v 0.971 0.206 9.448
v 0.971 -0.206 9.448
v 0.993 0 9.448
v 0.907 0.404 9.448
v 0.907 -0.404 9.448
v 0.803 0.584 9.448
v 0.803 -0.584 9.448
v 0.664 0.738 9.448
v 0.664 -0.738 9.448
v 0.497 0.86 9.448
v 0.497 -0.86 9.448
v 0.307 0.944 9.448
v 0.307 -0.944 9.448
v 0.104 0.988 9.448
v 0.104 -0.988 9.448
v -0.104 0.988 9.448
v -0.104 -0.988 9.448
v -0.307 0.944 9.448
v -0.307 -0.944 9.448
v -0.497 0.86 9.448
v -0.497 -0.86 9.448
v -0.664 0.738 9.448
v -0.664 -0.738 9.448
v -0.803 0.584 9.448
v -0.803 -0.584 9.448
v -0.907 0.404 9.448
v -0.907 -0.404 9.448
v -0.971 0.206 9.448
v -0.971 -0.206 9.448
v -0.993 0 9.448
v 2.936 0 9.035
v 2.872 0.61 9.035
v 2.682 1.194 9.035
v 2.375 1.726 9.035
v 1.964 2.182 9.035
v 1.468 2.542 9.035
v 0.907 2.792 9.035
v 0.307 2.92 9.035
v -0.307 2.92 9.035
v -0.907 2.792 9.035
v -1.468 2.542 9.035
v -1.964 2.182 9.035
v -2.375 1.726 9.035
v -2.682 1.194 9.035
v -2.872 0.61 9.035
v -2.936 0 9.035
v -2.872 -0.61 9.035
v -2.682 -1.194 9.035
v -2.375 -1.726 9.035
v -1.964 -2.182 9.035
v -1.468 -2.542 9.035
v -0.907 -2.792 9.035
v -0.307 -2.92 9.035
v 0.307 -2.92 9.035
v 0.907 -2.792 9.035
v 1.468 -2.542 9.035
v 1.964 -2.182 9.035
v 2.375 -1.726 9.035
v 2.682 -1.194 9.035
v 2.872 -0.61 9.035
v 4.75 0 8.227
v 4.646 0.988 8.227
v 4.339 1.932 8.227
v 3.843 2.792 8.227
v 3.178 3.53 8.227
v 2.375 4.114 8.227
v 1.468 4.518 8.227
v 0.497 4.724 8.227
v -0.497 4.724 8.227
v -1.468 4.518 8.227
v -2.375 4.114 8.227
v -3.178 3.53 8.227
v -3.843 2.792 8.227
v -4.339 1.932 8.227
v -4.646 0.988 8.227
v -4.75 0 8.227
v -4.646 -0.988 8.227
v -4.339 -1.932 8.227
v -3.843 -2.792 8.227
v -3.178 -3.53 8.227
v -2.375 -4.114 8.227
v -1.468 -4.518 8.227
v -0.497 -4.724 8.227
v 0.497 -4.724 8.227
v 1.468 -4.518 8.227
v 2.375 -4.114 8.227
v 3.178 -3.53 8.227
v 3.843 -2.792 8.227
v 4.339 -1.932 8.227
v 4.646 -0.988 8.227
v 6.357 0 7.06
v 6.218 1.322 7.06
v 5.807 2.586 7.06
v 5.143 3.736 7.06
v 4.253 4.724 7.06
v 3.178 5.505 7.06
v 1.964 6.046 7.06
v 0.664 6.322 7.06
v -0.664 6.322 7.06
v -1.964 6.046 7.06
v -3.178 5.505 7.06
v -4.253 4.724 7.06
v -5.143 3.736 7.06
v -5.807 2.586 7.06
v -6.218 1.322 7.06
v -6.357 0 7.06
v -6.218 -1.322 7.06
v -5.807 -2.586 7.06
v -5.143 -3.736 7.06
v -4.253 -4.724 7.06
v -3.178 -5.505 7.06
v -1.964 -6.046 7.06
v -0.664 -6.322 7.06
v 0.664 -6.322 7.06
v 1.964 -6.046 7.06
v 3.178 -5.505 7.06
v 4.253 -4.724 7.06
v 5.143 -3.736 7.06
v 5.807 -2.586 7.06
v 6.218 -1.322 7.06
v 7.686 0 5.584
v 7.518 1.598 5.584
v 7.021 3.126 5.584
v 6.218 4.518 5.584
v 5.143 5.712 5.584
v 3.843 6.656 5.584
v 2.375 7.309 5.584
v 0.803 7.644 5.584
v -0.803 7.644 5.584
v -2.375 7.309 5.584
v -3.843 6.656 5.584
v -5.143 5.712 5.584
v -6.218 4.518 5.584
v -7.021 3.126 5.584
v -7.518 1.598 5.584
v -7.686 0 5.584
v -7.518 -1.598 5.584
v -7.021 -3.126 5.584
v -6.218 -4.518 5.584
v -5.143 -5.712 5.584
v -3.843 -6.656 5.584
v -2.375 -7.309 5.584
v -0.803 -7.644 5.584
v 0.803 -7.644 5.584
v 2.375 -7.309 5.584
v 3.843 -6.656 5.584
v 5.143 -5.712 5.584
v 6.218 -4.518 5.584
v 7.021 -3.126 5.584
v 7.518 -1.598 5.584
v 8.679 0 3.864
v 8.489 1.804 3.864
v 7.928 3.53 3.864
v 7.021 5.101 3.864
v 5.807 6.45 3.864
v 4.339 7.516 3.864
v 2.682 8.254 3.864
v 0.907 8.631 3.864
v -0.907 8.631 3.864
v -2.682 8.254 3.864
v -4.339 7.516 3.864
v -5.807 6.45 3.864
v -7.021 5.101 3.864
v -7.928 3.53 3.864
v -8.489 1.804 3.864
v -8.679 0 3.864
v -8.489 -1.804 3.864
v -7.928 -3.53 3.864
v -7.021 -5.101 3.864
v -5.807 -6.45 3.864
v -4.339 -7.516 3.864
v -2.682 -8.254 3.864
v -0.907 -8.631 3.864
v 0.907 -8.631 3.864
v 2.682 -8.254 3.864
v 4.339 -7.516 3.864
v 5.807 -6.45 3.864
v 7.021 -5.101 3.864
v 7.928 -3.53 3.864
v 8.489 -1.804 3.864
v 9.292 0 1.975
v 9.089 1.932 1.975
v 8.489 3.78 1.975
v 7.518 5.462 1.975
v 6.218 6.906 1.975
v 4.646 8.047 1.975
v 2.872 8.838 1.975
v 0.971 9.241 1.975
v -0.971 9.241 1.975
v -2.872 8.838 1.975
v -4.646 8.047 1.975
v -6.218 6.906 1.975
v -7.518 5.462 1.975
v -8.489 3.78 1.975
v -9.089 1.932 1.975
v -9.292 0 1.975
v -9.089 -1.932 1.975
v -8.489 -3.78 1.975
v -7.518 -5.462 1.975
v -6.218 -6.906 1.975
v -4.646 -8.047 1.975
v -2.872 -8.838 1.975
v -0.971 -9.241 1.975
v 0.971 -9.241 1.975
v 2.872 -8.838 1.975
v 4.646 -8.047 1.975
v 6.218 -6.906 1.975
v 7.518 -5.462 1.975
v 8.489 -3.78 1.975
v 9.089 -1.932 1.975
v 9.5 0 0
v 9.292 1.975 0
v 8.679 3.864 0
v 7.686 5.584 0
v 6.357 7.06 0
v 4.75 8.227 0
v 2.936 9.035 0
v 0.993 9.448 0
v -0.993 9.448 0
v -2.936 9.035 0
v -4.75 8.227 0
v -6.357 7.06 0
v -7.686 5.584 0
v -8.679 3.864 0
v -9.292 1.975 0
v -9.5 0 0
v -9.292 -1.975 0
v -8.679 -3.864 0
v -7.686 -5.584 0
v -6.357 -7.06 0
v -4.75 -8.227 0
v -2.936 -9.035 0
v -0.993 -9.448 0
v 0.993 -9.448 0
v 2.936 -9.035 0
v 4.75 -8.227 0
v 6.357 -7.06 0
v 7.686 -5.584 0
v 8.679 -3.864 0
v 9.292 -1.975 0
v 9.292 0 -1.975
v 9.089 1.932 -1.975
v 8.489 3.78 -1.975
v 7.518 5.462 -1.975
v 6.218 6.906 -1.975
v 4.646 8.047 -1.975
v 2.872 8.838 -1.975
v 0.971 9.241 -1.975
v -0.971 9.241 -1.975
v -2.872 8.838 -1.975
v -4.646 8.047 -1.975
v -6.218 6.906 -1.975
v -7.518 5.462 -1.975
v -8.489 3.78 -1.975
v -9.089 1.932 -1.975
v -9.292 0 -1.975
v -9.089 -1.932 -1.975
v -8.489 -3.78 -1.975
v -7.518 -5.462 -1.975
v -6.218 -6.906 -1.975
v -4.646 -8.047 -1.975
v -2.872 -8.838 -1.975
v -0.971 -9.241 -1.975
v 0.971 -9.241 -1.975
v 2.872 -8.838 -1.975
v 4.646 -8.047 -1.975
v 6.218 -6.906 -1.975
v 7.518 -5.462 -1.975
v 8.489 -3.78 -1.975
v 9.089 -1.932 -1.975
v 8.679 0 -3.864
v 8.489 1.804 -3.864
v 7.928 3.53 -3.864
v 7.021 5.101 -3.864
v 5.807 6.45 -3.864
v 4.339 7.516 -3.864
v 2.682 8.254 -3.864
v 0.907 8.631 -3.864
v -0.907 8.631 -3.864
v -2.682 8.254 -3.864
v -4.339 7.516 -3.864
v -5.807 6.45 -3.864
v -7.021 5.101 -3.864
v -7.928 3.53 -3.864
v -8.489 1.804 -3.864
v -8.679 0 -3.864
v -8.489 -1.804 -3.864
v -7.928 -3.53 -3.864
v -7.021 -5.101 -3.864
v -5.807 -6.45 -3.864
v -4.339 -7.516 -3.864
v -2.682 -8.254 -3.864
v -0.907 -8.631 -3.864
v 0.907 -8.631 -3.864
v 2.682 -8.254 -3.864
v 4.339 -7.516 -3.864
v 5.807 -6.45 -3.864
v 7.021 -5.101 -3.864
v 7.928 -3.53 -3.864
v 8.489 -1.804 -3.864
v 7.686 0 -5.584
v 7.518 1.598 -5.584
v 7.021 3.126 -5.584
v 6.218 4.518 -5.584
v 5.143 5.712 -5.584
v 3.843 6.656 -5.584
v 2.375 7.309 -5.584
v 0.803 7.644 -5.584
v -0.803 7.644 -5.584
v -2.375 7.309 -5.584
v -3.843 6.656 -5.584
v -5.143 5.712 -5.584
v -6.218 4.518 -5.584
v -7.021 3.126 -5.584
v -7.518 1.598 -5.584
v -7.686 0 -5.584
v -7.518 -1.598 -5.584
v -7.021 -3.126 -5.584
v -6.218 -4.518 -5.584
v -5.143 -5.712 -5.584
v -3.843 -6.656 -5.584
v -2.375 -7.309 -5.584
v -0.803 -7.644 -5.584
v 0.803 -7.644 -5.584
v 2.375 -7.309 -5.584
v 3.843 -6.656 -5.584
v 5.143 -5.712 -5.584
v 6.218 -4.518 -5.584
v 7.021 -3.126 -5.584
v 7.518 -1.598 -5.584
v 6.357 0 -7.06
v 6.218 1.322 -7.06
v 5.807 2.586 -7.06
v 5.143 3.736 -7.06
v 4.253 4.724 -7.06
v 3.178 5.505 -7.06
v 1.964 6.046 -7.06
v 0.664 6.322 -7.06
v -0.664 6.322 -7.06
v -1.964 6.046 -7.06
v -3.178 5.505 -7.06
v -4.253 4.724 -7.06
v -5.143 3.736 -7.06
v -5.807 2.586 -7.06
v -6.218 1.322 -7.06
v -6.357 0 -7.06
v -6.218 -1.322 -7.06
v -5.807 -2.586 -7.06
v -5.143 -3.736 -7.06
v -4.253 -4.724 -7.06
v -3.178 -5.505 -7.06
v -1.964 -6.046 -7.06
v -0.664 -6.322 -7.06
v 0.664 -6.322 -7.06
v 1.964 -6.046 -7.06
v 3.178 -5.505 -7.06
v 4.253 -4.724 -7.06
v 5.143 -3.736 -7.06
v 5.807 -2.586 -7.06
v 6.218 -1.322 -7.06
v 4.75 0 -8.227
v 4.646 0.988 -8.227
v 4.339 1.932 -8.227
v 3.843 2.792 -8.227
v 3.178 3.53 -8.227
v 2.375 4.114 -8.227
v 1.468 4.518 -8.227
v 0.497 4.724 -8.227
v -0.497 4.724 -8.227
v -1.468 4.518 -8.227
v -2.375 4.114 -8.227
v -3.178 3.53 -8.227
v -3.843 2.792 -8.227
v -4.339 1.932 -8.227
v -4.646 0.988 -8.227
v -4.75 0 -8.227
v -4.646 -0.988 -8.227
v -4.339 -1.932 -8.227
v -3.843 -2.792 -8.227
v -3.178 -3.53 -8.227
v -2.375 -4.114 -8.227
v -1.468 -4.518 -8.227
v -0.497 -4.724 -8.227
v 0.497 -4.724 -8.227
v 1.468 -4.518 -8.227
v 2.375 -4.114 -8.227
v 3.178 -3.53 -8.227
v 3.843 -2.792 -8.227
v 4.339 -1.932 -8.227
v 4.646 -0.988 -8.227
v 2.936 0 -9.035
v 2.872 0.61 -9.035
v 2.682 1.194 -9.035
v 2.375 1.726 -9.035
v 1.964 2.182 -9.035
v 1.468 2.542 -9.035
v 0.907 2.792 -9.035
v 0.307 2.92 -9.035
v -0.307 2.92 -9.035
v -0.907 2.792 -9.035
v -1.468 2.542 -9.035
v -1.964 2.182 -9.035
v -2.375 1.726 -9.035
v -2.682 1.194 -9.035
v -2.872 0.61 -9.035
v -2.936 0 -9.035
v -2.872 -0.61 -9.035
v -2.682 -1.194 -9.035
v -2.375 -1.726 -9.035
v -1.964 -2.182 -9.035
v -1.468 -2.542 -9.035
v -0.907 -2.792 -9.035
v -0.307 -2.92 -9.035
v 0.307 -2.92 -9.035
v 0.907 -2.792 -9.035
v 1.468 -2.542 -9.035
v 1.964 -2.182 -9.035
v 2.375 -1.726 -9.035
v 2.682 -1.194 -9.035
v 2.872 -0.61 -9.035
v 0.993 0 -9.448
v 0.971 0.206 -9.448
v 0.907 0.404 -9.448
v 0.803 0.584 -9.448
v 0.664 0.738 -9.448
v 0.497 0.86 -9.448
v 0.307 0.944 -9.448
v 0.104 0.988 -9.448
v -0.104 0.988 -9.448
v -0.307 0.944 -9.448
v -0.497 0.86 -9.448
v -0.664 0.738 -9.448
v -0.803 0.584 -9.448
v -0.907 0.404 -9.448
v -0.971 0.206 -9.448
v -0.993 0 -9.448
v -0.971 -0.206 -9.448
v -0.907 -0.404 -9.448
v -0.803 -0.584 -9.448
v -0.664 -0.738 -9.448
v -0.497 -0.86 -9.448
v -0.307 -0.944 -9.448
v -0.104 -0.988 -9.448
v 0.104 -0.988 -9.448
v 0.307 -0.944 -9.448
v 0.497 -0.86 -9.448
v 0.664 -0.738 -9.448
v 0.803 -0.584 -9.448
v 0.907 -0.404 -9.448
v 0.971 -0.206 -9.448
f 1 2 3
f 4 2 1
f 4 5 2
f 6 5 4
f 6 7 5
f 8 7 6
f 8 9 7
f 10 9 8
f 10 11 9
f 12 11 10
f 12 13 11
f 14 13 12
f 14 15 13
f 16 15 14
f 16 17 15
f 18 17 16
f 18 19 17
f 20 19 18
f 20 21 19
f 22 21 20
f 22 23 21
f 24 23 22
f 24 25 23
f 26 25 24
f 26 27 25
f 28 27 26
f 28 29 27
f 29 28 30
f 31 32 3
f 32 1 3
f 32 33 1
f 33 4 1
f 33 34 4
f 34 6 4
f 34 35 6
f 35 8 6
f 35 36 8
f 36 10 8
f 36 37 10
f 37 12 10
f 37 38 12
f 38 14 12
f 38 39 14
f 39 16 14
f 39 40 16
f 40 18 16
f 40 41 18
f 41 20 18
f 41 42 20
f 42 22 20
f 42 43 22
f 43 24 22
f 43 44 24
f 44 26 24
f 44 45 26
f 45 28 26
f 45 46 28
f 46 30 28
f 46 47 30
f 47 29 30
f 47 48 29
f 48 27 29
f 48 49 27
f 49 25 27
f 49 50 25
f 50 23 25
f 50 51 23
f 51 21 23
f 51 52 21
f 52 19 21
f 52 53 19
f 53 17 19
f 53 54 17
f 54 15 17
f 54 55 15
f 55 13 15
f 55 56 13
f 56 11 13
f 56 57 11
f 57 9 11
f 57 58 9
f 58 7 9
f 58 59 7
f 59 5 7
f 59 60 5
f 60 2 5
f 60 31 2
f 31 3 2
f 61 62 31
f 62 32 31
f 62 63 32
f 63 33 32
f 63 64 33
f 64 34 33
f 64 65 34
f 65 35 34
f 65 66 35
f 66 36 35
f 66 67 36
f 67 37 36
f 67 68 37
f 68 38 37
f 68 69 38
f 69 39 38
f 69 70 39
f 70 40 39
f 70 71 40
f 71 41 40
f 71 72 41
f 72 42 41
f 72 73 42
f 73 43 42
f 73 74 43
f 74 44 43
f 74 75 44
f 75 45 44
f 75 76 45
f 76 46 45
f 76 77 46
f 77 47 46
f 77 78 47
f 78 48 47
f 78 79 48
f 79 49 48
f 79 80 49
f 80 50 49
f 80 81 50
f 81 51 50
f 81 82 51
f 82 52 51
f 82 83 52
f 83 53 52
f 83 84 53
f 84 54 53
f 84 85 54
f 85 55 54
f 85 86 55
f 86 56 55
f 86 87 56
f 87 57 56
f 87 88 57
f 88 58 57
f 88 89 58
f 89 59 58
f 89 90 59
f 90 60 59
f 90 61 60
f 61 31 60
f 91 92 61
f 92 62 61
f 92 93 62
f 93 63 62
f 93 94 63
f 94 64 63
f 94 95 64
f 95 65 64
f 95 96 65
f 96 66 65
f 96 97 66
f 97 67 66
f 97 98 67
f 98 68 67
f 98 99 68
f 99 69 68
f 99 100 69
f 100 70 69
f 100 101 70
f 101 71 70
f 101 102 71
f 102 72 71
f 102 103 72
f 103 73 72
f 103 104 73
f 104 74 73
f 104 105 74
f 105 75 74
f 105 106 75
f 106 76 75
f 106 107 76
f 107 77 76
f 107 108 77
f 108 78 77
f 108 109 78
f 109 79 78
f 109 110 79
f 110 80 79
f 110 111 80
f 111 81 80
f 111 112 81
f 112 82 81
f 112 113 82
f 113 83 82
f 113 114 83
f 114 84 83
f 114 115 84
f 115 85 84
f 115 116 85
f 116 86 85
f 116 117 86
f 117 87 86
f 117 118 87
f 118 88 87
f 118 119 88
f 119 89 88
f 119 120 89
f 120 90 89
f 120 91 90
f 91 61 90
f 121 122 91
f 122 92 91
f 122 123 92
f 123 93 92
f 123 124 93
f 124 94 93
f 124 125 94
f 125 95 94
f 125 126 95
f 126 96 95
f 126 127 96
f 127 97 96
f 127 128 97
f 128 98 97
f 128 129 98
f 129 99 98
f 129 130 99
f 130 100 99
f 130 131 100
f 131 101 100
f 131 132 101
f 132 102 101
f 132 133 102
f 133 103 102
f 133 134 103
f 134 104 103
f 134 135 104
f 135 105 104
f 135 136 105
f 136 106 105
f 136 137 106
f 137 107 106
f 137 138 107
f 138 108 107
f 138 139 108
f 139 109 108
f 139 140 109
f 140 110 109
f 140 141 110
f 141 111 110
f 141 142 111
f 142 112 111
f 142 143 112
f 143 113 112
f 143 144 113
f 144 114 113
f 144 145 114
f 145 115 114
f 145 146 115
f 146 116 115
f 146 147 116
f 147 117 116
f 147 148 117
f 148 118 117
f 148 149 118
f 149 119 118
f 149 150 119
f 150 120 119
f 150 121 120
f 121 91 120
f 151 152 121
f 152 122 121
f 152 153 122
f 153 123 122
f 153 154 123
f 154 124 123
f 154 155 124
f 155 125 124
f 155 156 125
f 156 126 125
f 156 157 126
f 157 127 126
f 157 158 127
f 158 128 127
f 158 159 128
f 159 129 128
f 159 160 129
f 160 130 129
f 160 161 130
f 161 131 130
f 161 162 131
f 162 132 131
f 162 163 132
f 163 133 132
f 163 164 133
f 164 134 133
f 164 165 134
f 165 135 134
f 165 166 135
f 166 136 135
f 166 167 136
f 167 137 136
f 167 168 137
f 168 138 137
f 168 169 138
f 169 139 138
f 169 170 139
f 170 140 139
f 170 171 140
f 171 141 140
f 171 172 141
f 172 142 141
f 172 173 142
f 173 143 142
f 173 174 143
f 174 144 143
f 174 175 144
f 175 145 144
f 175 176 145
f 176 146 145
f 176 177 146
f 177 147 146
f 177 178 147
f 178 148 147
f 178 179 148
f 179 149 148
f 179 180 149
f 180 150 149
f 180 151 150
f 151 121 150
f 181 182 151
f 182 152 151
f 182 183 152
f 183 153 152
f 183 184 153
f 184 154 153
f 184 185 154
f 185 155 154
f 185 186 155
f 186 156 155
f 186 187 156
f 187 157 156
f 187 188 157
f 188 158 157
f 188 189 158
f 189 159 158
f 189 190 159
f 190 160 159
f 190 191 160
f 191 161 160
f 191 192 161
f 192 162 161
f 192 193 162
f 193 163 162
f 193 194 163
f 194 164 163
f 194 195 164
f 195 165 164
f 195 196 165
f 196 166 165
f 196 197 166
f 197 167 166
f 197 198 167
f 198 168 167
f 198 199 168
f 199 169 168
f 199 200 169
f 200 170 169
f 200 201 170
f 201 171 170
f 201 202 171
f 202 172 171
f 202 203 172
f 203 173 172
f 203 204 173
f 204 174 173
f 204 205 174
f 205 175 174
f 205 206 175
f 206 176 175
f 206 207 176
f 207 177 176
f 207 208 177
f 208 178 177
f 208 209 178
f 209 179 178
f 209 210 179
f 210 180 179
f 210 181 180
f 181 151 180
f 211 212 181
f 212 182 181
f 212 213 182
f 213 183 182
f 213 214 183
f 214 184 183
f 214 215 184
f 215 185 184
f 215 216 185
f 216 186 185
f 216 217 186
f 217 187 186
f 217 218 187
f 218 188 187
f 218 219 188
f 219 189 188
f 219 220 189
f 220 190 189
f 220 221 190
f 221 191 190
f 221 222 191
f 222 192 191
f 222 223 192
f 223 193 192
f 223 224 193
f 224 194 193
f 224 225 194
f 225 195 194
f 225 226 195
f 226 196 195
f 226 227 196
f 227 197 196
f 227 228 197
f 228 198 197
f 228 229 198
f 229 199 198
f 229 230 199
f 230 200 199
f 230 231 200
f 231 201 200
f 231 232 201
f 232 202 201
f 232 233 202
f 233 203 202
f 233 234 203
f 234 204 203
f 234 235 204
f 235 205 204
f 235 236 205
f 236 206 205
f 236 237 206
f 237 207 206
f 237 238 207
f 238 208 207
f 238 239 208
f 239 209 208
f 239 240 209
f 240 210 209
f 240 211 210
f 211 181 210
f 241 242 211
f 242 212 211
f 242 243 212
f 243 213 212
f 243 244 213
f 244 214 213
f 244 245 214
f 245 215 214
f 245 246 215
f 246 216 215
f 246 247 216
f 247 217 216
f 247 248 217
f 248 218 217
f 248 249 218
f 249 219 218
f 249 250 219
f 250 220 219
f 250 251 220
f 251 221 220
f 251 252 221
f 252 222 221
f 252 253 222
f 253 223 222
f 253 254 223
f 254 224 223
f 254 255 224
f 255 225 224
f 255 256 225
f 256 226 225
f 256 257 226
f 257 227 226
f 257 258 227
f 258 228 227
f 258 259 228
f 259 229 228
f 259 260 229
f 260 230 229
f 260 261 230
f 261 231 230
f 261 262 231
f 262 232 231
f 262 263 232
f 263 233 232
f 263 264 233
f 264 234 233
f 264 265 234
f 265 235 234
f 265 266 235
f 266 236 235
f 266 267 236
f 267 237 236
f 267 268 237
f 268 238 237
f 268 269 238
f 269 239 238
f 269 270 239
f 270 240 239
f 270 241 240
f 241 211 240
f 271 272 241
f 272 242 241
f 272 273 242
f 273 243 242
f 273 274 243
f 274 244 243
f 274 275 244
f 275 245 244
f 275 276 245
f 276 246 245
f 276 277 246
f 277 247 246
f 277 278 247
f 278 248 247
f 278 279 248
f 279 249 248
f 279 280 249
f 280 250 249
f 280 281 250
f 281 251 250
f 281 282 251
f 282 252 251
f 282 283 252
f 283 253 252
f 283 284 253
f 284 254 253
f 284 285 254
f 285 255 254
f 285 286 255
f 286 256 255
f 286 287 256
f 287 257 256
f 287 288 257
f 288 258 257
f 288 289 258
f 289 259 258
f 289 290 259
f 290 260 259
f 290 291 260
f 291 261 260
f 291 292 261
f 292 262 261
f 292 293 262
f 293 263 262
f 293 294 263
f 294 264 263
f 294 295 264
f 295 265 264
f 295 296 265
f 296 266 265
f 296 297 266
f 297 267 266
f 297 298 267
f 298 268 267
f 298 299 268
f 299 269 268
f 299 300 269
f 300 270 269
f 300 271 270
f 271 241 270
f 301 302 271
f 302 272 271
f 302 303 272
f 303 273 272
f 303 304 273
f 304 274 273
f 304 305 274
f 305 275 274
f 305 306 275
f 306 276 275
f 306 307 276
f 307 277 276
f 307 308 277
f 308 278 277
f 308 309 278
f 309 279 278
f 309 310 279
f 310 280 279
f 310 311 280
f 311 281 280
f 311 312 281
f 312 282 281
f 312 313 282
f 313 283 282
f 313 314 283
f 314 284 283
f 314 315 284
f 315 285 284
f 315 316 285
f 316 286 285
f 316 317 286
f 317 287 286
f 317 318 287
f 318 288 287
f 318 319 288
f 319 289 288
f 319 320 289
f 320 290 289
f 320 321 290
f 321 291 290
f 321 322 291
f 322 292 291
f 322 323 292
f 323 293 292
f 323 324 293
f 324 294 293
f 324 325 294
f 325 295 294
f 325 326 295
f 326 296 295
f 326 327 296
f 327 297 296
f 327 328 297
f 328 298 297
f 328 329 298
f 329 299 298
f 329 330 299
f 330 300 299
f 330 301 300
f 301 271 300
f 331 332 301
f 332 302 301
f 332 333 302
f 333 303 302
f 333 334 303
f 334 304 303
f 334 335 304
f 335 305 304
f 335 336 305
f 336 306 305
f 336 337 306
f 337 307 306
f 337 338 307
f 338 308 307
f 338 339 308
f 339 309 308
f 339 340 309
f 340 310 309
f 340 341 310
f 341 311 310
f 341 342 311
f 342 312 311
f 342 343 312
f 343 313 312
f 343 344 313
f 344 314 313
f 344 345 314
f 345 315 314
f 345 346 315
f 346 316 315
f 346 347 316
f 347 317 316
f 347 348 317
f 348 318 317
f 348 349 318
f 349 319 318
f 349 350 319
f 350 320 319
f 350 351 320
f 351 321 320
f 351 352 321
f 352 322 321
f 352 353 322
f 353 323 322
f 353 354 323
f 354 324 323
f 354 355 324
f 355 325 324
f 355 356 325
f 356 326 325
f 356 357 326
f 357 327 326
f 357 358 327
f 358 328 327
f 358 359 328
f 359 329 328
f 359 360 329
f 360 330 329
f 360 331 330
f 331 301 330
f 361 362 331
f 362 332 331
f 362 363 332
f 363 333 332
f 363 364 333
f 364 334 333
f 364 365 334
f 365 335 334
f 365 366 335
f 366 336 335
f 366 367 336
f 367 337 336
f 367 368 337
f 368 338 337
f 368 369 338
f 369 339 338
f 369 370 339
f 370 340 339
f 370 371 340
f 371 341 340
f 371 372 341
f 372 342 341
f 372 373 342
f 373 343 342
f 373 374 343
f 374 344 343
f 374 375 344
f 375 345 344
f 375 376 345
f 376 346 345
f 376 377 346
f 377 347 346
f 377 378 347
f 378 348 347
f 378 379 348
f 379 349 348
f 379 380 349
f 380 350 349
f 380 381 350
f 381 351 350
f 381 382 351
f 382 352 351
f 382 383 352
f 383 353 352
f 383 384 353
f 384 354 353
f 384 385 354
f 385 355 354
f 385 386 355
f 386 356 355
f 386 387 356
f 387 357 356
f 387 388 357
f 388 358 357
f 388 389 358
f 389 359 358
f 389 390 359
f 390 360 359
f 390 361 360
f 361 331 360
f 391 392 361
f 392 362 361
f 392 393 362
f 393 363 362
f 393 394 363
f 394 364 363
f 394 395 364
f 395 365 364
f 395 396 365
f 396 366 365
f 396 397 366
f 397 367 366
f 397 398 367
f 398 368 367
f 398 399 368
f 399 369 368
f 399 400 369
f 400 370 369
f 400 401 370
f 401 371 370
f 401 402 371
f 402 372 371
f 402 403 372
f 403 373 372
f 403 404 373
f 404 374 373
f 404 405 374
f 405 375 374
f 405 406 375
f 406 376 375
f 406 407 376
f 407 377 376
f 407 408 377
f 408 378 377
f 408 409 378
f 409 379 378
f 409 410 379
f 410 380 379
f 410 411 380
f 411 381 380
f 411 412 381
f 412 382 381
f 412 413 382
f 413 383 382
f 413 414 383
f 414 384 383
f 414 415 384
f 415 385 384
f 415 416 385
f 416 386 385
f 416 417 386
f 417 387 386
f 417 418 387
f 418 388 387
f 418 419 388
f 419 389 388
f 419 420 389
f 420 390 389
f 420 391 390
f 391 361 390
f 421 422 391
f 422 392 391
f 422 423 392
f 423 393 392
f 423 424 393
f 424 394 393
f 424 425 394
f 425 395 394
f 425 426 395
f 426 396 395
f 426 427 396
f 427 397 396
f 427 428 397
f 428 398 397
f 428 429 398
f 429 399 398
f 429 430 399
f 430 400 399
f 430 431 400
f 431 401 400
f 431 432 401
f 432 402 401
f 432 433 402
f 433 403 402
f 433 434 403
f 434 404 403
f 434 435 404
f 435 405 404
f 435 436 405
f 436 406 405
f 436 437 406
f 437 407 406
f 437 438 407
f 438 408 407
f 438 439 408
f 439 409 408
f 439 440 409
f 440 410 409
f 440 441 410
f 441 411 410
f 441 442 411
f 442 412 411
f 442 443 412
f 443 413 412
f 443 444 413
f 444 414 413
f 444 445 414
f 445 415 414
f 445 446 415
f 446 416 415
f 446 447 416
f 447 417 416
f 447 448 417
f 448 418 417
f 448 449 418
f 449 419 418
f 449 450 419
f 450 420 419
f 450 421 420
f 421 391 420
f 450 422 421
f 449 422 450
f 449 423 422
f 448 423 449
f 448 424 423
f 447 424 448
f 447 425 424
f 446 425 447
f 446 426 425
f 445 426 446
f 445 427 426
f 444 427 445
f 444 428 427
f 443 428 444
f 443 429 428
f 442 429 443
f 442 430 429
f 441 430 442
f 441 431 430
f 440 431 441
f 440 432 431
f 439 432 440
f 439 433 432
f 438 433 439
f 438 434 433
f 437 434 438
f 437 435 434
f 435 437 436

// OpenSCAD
// Generated by SolidPython 1.0.1 on 2020-07-29 00:02:42


sphere(d = 19, r = 3);
/***********************************************
*********      SolidPython code:      **********
************************************************
 
# import packages: SolidPython
from solid import *
from solid.utils import *
from itertools import chain, combinations


class Resize:

    def __init__(self, scad_file):
        self.scad_file = scad_file
        #self.scad_file = import_scad(scad_file)
        # cone/cylinder param:
        self.r1 = 0
        self.r2 = 0
        self.h = 0
        # rectangular prism param:
        self.w = 0
        self.l = 0
        # ellipse param:
        self.r = 0

    # import OpenScad code (file name corresponds to shape)


    # classify shape + parameters
    def assign(self, param1, param2, param3):
        if self.scad_file == 'cone.scad':
            self.r1 = param1
            self.r2 = param2
            self.h = param3
        elif self.scad_file == 'cylinder.scad':
            self.r1 = param1
            self.r2 = param2
            self.h = param3
        elif self.scad_file == 'rectangularPrism.scad':
            self.h = param1
            self.l = param2
            self.w = param3
        else:
            self.r = param1
            self.h = param2

    # resize parameters
    def iterate(self):
        x = range(3, 20, 2)
        i = 1
        if self.scad_file == 'cone.scad':
            tempList = list(combinations(x, 3))
            #print(tempList)
            for i in x:
                for j in range (3):
                    param1 = tempList[i][0]
                    param2 = tempList[i][1]
                    param3 = tempList[i][2]
                    filepath = 'produced_scad_files/' + 'cone' + str(param1) + '_' + str(param2) + '_' + str(param3) + '.scad'
                    scad_render_to_file(cylinder(h=param1, r1=param2, r2=param3), filepath)

        elif self.scad_file == 'cylinder.scad':
            tempList = list(combinations(x, 3))
            for i in x:
                for j in range(3):
                    param1 = tempList[i][0]
                    param2 = tempList[i][1]
                    param3 = tempList[i][2]
                    filepath = 'produced_scad_files/' + 'cylinder' + str(param1) + '_' + str(param2) + '_' + str(param3) + '.scad'
                    scad_render_to_file(cylinder(h=param1, r1=param2, r2=param3), filepath)

        elif self.scad_file == 'rectangularPrism.scad':
            tempList = list(combinations(x, 3))
            for i in x:
                for j in range(3):
                    param1 = tempList[i][0]
                    param2 = tempList[i][1]
                    param3 = tempList[i][2]
                    filepath = 'produced_scad_files/' + 'rectangularPrism' + str(param1) + '_' + str(param2) + '_' + str(
                        param3) + '.scad'
                    scad_render_to_file(cube(size=(param1, param2, param3)), filepath)

        else:
            tempList = list(combinations(x, 2))
            for i in x:
                for j in range(3):
                    param1 = tempList[i][0]
                    param2 = tempList[i][1]
                    filepath = 'produced_scad_files/' + 'ellipse' + str(param1) + '_' + str(param2) + '_' + '.scad'
                    scad_render_to_file(sphere(param1, param2), filepath)

    def render_to_scadfile(self):
        scad_render_to_file(scad, 'example.scad') 
 
************************************************/
